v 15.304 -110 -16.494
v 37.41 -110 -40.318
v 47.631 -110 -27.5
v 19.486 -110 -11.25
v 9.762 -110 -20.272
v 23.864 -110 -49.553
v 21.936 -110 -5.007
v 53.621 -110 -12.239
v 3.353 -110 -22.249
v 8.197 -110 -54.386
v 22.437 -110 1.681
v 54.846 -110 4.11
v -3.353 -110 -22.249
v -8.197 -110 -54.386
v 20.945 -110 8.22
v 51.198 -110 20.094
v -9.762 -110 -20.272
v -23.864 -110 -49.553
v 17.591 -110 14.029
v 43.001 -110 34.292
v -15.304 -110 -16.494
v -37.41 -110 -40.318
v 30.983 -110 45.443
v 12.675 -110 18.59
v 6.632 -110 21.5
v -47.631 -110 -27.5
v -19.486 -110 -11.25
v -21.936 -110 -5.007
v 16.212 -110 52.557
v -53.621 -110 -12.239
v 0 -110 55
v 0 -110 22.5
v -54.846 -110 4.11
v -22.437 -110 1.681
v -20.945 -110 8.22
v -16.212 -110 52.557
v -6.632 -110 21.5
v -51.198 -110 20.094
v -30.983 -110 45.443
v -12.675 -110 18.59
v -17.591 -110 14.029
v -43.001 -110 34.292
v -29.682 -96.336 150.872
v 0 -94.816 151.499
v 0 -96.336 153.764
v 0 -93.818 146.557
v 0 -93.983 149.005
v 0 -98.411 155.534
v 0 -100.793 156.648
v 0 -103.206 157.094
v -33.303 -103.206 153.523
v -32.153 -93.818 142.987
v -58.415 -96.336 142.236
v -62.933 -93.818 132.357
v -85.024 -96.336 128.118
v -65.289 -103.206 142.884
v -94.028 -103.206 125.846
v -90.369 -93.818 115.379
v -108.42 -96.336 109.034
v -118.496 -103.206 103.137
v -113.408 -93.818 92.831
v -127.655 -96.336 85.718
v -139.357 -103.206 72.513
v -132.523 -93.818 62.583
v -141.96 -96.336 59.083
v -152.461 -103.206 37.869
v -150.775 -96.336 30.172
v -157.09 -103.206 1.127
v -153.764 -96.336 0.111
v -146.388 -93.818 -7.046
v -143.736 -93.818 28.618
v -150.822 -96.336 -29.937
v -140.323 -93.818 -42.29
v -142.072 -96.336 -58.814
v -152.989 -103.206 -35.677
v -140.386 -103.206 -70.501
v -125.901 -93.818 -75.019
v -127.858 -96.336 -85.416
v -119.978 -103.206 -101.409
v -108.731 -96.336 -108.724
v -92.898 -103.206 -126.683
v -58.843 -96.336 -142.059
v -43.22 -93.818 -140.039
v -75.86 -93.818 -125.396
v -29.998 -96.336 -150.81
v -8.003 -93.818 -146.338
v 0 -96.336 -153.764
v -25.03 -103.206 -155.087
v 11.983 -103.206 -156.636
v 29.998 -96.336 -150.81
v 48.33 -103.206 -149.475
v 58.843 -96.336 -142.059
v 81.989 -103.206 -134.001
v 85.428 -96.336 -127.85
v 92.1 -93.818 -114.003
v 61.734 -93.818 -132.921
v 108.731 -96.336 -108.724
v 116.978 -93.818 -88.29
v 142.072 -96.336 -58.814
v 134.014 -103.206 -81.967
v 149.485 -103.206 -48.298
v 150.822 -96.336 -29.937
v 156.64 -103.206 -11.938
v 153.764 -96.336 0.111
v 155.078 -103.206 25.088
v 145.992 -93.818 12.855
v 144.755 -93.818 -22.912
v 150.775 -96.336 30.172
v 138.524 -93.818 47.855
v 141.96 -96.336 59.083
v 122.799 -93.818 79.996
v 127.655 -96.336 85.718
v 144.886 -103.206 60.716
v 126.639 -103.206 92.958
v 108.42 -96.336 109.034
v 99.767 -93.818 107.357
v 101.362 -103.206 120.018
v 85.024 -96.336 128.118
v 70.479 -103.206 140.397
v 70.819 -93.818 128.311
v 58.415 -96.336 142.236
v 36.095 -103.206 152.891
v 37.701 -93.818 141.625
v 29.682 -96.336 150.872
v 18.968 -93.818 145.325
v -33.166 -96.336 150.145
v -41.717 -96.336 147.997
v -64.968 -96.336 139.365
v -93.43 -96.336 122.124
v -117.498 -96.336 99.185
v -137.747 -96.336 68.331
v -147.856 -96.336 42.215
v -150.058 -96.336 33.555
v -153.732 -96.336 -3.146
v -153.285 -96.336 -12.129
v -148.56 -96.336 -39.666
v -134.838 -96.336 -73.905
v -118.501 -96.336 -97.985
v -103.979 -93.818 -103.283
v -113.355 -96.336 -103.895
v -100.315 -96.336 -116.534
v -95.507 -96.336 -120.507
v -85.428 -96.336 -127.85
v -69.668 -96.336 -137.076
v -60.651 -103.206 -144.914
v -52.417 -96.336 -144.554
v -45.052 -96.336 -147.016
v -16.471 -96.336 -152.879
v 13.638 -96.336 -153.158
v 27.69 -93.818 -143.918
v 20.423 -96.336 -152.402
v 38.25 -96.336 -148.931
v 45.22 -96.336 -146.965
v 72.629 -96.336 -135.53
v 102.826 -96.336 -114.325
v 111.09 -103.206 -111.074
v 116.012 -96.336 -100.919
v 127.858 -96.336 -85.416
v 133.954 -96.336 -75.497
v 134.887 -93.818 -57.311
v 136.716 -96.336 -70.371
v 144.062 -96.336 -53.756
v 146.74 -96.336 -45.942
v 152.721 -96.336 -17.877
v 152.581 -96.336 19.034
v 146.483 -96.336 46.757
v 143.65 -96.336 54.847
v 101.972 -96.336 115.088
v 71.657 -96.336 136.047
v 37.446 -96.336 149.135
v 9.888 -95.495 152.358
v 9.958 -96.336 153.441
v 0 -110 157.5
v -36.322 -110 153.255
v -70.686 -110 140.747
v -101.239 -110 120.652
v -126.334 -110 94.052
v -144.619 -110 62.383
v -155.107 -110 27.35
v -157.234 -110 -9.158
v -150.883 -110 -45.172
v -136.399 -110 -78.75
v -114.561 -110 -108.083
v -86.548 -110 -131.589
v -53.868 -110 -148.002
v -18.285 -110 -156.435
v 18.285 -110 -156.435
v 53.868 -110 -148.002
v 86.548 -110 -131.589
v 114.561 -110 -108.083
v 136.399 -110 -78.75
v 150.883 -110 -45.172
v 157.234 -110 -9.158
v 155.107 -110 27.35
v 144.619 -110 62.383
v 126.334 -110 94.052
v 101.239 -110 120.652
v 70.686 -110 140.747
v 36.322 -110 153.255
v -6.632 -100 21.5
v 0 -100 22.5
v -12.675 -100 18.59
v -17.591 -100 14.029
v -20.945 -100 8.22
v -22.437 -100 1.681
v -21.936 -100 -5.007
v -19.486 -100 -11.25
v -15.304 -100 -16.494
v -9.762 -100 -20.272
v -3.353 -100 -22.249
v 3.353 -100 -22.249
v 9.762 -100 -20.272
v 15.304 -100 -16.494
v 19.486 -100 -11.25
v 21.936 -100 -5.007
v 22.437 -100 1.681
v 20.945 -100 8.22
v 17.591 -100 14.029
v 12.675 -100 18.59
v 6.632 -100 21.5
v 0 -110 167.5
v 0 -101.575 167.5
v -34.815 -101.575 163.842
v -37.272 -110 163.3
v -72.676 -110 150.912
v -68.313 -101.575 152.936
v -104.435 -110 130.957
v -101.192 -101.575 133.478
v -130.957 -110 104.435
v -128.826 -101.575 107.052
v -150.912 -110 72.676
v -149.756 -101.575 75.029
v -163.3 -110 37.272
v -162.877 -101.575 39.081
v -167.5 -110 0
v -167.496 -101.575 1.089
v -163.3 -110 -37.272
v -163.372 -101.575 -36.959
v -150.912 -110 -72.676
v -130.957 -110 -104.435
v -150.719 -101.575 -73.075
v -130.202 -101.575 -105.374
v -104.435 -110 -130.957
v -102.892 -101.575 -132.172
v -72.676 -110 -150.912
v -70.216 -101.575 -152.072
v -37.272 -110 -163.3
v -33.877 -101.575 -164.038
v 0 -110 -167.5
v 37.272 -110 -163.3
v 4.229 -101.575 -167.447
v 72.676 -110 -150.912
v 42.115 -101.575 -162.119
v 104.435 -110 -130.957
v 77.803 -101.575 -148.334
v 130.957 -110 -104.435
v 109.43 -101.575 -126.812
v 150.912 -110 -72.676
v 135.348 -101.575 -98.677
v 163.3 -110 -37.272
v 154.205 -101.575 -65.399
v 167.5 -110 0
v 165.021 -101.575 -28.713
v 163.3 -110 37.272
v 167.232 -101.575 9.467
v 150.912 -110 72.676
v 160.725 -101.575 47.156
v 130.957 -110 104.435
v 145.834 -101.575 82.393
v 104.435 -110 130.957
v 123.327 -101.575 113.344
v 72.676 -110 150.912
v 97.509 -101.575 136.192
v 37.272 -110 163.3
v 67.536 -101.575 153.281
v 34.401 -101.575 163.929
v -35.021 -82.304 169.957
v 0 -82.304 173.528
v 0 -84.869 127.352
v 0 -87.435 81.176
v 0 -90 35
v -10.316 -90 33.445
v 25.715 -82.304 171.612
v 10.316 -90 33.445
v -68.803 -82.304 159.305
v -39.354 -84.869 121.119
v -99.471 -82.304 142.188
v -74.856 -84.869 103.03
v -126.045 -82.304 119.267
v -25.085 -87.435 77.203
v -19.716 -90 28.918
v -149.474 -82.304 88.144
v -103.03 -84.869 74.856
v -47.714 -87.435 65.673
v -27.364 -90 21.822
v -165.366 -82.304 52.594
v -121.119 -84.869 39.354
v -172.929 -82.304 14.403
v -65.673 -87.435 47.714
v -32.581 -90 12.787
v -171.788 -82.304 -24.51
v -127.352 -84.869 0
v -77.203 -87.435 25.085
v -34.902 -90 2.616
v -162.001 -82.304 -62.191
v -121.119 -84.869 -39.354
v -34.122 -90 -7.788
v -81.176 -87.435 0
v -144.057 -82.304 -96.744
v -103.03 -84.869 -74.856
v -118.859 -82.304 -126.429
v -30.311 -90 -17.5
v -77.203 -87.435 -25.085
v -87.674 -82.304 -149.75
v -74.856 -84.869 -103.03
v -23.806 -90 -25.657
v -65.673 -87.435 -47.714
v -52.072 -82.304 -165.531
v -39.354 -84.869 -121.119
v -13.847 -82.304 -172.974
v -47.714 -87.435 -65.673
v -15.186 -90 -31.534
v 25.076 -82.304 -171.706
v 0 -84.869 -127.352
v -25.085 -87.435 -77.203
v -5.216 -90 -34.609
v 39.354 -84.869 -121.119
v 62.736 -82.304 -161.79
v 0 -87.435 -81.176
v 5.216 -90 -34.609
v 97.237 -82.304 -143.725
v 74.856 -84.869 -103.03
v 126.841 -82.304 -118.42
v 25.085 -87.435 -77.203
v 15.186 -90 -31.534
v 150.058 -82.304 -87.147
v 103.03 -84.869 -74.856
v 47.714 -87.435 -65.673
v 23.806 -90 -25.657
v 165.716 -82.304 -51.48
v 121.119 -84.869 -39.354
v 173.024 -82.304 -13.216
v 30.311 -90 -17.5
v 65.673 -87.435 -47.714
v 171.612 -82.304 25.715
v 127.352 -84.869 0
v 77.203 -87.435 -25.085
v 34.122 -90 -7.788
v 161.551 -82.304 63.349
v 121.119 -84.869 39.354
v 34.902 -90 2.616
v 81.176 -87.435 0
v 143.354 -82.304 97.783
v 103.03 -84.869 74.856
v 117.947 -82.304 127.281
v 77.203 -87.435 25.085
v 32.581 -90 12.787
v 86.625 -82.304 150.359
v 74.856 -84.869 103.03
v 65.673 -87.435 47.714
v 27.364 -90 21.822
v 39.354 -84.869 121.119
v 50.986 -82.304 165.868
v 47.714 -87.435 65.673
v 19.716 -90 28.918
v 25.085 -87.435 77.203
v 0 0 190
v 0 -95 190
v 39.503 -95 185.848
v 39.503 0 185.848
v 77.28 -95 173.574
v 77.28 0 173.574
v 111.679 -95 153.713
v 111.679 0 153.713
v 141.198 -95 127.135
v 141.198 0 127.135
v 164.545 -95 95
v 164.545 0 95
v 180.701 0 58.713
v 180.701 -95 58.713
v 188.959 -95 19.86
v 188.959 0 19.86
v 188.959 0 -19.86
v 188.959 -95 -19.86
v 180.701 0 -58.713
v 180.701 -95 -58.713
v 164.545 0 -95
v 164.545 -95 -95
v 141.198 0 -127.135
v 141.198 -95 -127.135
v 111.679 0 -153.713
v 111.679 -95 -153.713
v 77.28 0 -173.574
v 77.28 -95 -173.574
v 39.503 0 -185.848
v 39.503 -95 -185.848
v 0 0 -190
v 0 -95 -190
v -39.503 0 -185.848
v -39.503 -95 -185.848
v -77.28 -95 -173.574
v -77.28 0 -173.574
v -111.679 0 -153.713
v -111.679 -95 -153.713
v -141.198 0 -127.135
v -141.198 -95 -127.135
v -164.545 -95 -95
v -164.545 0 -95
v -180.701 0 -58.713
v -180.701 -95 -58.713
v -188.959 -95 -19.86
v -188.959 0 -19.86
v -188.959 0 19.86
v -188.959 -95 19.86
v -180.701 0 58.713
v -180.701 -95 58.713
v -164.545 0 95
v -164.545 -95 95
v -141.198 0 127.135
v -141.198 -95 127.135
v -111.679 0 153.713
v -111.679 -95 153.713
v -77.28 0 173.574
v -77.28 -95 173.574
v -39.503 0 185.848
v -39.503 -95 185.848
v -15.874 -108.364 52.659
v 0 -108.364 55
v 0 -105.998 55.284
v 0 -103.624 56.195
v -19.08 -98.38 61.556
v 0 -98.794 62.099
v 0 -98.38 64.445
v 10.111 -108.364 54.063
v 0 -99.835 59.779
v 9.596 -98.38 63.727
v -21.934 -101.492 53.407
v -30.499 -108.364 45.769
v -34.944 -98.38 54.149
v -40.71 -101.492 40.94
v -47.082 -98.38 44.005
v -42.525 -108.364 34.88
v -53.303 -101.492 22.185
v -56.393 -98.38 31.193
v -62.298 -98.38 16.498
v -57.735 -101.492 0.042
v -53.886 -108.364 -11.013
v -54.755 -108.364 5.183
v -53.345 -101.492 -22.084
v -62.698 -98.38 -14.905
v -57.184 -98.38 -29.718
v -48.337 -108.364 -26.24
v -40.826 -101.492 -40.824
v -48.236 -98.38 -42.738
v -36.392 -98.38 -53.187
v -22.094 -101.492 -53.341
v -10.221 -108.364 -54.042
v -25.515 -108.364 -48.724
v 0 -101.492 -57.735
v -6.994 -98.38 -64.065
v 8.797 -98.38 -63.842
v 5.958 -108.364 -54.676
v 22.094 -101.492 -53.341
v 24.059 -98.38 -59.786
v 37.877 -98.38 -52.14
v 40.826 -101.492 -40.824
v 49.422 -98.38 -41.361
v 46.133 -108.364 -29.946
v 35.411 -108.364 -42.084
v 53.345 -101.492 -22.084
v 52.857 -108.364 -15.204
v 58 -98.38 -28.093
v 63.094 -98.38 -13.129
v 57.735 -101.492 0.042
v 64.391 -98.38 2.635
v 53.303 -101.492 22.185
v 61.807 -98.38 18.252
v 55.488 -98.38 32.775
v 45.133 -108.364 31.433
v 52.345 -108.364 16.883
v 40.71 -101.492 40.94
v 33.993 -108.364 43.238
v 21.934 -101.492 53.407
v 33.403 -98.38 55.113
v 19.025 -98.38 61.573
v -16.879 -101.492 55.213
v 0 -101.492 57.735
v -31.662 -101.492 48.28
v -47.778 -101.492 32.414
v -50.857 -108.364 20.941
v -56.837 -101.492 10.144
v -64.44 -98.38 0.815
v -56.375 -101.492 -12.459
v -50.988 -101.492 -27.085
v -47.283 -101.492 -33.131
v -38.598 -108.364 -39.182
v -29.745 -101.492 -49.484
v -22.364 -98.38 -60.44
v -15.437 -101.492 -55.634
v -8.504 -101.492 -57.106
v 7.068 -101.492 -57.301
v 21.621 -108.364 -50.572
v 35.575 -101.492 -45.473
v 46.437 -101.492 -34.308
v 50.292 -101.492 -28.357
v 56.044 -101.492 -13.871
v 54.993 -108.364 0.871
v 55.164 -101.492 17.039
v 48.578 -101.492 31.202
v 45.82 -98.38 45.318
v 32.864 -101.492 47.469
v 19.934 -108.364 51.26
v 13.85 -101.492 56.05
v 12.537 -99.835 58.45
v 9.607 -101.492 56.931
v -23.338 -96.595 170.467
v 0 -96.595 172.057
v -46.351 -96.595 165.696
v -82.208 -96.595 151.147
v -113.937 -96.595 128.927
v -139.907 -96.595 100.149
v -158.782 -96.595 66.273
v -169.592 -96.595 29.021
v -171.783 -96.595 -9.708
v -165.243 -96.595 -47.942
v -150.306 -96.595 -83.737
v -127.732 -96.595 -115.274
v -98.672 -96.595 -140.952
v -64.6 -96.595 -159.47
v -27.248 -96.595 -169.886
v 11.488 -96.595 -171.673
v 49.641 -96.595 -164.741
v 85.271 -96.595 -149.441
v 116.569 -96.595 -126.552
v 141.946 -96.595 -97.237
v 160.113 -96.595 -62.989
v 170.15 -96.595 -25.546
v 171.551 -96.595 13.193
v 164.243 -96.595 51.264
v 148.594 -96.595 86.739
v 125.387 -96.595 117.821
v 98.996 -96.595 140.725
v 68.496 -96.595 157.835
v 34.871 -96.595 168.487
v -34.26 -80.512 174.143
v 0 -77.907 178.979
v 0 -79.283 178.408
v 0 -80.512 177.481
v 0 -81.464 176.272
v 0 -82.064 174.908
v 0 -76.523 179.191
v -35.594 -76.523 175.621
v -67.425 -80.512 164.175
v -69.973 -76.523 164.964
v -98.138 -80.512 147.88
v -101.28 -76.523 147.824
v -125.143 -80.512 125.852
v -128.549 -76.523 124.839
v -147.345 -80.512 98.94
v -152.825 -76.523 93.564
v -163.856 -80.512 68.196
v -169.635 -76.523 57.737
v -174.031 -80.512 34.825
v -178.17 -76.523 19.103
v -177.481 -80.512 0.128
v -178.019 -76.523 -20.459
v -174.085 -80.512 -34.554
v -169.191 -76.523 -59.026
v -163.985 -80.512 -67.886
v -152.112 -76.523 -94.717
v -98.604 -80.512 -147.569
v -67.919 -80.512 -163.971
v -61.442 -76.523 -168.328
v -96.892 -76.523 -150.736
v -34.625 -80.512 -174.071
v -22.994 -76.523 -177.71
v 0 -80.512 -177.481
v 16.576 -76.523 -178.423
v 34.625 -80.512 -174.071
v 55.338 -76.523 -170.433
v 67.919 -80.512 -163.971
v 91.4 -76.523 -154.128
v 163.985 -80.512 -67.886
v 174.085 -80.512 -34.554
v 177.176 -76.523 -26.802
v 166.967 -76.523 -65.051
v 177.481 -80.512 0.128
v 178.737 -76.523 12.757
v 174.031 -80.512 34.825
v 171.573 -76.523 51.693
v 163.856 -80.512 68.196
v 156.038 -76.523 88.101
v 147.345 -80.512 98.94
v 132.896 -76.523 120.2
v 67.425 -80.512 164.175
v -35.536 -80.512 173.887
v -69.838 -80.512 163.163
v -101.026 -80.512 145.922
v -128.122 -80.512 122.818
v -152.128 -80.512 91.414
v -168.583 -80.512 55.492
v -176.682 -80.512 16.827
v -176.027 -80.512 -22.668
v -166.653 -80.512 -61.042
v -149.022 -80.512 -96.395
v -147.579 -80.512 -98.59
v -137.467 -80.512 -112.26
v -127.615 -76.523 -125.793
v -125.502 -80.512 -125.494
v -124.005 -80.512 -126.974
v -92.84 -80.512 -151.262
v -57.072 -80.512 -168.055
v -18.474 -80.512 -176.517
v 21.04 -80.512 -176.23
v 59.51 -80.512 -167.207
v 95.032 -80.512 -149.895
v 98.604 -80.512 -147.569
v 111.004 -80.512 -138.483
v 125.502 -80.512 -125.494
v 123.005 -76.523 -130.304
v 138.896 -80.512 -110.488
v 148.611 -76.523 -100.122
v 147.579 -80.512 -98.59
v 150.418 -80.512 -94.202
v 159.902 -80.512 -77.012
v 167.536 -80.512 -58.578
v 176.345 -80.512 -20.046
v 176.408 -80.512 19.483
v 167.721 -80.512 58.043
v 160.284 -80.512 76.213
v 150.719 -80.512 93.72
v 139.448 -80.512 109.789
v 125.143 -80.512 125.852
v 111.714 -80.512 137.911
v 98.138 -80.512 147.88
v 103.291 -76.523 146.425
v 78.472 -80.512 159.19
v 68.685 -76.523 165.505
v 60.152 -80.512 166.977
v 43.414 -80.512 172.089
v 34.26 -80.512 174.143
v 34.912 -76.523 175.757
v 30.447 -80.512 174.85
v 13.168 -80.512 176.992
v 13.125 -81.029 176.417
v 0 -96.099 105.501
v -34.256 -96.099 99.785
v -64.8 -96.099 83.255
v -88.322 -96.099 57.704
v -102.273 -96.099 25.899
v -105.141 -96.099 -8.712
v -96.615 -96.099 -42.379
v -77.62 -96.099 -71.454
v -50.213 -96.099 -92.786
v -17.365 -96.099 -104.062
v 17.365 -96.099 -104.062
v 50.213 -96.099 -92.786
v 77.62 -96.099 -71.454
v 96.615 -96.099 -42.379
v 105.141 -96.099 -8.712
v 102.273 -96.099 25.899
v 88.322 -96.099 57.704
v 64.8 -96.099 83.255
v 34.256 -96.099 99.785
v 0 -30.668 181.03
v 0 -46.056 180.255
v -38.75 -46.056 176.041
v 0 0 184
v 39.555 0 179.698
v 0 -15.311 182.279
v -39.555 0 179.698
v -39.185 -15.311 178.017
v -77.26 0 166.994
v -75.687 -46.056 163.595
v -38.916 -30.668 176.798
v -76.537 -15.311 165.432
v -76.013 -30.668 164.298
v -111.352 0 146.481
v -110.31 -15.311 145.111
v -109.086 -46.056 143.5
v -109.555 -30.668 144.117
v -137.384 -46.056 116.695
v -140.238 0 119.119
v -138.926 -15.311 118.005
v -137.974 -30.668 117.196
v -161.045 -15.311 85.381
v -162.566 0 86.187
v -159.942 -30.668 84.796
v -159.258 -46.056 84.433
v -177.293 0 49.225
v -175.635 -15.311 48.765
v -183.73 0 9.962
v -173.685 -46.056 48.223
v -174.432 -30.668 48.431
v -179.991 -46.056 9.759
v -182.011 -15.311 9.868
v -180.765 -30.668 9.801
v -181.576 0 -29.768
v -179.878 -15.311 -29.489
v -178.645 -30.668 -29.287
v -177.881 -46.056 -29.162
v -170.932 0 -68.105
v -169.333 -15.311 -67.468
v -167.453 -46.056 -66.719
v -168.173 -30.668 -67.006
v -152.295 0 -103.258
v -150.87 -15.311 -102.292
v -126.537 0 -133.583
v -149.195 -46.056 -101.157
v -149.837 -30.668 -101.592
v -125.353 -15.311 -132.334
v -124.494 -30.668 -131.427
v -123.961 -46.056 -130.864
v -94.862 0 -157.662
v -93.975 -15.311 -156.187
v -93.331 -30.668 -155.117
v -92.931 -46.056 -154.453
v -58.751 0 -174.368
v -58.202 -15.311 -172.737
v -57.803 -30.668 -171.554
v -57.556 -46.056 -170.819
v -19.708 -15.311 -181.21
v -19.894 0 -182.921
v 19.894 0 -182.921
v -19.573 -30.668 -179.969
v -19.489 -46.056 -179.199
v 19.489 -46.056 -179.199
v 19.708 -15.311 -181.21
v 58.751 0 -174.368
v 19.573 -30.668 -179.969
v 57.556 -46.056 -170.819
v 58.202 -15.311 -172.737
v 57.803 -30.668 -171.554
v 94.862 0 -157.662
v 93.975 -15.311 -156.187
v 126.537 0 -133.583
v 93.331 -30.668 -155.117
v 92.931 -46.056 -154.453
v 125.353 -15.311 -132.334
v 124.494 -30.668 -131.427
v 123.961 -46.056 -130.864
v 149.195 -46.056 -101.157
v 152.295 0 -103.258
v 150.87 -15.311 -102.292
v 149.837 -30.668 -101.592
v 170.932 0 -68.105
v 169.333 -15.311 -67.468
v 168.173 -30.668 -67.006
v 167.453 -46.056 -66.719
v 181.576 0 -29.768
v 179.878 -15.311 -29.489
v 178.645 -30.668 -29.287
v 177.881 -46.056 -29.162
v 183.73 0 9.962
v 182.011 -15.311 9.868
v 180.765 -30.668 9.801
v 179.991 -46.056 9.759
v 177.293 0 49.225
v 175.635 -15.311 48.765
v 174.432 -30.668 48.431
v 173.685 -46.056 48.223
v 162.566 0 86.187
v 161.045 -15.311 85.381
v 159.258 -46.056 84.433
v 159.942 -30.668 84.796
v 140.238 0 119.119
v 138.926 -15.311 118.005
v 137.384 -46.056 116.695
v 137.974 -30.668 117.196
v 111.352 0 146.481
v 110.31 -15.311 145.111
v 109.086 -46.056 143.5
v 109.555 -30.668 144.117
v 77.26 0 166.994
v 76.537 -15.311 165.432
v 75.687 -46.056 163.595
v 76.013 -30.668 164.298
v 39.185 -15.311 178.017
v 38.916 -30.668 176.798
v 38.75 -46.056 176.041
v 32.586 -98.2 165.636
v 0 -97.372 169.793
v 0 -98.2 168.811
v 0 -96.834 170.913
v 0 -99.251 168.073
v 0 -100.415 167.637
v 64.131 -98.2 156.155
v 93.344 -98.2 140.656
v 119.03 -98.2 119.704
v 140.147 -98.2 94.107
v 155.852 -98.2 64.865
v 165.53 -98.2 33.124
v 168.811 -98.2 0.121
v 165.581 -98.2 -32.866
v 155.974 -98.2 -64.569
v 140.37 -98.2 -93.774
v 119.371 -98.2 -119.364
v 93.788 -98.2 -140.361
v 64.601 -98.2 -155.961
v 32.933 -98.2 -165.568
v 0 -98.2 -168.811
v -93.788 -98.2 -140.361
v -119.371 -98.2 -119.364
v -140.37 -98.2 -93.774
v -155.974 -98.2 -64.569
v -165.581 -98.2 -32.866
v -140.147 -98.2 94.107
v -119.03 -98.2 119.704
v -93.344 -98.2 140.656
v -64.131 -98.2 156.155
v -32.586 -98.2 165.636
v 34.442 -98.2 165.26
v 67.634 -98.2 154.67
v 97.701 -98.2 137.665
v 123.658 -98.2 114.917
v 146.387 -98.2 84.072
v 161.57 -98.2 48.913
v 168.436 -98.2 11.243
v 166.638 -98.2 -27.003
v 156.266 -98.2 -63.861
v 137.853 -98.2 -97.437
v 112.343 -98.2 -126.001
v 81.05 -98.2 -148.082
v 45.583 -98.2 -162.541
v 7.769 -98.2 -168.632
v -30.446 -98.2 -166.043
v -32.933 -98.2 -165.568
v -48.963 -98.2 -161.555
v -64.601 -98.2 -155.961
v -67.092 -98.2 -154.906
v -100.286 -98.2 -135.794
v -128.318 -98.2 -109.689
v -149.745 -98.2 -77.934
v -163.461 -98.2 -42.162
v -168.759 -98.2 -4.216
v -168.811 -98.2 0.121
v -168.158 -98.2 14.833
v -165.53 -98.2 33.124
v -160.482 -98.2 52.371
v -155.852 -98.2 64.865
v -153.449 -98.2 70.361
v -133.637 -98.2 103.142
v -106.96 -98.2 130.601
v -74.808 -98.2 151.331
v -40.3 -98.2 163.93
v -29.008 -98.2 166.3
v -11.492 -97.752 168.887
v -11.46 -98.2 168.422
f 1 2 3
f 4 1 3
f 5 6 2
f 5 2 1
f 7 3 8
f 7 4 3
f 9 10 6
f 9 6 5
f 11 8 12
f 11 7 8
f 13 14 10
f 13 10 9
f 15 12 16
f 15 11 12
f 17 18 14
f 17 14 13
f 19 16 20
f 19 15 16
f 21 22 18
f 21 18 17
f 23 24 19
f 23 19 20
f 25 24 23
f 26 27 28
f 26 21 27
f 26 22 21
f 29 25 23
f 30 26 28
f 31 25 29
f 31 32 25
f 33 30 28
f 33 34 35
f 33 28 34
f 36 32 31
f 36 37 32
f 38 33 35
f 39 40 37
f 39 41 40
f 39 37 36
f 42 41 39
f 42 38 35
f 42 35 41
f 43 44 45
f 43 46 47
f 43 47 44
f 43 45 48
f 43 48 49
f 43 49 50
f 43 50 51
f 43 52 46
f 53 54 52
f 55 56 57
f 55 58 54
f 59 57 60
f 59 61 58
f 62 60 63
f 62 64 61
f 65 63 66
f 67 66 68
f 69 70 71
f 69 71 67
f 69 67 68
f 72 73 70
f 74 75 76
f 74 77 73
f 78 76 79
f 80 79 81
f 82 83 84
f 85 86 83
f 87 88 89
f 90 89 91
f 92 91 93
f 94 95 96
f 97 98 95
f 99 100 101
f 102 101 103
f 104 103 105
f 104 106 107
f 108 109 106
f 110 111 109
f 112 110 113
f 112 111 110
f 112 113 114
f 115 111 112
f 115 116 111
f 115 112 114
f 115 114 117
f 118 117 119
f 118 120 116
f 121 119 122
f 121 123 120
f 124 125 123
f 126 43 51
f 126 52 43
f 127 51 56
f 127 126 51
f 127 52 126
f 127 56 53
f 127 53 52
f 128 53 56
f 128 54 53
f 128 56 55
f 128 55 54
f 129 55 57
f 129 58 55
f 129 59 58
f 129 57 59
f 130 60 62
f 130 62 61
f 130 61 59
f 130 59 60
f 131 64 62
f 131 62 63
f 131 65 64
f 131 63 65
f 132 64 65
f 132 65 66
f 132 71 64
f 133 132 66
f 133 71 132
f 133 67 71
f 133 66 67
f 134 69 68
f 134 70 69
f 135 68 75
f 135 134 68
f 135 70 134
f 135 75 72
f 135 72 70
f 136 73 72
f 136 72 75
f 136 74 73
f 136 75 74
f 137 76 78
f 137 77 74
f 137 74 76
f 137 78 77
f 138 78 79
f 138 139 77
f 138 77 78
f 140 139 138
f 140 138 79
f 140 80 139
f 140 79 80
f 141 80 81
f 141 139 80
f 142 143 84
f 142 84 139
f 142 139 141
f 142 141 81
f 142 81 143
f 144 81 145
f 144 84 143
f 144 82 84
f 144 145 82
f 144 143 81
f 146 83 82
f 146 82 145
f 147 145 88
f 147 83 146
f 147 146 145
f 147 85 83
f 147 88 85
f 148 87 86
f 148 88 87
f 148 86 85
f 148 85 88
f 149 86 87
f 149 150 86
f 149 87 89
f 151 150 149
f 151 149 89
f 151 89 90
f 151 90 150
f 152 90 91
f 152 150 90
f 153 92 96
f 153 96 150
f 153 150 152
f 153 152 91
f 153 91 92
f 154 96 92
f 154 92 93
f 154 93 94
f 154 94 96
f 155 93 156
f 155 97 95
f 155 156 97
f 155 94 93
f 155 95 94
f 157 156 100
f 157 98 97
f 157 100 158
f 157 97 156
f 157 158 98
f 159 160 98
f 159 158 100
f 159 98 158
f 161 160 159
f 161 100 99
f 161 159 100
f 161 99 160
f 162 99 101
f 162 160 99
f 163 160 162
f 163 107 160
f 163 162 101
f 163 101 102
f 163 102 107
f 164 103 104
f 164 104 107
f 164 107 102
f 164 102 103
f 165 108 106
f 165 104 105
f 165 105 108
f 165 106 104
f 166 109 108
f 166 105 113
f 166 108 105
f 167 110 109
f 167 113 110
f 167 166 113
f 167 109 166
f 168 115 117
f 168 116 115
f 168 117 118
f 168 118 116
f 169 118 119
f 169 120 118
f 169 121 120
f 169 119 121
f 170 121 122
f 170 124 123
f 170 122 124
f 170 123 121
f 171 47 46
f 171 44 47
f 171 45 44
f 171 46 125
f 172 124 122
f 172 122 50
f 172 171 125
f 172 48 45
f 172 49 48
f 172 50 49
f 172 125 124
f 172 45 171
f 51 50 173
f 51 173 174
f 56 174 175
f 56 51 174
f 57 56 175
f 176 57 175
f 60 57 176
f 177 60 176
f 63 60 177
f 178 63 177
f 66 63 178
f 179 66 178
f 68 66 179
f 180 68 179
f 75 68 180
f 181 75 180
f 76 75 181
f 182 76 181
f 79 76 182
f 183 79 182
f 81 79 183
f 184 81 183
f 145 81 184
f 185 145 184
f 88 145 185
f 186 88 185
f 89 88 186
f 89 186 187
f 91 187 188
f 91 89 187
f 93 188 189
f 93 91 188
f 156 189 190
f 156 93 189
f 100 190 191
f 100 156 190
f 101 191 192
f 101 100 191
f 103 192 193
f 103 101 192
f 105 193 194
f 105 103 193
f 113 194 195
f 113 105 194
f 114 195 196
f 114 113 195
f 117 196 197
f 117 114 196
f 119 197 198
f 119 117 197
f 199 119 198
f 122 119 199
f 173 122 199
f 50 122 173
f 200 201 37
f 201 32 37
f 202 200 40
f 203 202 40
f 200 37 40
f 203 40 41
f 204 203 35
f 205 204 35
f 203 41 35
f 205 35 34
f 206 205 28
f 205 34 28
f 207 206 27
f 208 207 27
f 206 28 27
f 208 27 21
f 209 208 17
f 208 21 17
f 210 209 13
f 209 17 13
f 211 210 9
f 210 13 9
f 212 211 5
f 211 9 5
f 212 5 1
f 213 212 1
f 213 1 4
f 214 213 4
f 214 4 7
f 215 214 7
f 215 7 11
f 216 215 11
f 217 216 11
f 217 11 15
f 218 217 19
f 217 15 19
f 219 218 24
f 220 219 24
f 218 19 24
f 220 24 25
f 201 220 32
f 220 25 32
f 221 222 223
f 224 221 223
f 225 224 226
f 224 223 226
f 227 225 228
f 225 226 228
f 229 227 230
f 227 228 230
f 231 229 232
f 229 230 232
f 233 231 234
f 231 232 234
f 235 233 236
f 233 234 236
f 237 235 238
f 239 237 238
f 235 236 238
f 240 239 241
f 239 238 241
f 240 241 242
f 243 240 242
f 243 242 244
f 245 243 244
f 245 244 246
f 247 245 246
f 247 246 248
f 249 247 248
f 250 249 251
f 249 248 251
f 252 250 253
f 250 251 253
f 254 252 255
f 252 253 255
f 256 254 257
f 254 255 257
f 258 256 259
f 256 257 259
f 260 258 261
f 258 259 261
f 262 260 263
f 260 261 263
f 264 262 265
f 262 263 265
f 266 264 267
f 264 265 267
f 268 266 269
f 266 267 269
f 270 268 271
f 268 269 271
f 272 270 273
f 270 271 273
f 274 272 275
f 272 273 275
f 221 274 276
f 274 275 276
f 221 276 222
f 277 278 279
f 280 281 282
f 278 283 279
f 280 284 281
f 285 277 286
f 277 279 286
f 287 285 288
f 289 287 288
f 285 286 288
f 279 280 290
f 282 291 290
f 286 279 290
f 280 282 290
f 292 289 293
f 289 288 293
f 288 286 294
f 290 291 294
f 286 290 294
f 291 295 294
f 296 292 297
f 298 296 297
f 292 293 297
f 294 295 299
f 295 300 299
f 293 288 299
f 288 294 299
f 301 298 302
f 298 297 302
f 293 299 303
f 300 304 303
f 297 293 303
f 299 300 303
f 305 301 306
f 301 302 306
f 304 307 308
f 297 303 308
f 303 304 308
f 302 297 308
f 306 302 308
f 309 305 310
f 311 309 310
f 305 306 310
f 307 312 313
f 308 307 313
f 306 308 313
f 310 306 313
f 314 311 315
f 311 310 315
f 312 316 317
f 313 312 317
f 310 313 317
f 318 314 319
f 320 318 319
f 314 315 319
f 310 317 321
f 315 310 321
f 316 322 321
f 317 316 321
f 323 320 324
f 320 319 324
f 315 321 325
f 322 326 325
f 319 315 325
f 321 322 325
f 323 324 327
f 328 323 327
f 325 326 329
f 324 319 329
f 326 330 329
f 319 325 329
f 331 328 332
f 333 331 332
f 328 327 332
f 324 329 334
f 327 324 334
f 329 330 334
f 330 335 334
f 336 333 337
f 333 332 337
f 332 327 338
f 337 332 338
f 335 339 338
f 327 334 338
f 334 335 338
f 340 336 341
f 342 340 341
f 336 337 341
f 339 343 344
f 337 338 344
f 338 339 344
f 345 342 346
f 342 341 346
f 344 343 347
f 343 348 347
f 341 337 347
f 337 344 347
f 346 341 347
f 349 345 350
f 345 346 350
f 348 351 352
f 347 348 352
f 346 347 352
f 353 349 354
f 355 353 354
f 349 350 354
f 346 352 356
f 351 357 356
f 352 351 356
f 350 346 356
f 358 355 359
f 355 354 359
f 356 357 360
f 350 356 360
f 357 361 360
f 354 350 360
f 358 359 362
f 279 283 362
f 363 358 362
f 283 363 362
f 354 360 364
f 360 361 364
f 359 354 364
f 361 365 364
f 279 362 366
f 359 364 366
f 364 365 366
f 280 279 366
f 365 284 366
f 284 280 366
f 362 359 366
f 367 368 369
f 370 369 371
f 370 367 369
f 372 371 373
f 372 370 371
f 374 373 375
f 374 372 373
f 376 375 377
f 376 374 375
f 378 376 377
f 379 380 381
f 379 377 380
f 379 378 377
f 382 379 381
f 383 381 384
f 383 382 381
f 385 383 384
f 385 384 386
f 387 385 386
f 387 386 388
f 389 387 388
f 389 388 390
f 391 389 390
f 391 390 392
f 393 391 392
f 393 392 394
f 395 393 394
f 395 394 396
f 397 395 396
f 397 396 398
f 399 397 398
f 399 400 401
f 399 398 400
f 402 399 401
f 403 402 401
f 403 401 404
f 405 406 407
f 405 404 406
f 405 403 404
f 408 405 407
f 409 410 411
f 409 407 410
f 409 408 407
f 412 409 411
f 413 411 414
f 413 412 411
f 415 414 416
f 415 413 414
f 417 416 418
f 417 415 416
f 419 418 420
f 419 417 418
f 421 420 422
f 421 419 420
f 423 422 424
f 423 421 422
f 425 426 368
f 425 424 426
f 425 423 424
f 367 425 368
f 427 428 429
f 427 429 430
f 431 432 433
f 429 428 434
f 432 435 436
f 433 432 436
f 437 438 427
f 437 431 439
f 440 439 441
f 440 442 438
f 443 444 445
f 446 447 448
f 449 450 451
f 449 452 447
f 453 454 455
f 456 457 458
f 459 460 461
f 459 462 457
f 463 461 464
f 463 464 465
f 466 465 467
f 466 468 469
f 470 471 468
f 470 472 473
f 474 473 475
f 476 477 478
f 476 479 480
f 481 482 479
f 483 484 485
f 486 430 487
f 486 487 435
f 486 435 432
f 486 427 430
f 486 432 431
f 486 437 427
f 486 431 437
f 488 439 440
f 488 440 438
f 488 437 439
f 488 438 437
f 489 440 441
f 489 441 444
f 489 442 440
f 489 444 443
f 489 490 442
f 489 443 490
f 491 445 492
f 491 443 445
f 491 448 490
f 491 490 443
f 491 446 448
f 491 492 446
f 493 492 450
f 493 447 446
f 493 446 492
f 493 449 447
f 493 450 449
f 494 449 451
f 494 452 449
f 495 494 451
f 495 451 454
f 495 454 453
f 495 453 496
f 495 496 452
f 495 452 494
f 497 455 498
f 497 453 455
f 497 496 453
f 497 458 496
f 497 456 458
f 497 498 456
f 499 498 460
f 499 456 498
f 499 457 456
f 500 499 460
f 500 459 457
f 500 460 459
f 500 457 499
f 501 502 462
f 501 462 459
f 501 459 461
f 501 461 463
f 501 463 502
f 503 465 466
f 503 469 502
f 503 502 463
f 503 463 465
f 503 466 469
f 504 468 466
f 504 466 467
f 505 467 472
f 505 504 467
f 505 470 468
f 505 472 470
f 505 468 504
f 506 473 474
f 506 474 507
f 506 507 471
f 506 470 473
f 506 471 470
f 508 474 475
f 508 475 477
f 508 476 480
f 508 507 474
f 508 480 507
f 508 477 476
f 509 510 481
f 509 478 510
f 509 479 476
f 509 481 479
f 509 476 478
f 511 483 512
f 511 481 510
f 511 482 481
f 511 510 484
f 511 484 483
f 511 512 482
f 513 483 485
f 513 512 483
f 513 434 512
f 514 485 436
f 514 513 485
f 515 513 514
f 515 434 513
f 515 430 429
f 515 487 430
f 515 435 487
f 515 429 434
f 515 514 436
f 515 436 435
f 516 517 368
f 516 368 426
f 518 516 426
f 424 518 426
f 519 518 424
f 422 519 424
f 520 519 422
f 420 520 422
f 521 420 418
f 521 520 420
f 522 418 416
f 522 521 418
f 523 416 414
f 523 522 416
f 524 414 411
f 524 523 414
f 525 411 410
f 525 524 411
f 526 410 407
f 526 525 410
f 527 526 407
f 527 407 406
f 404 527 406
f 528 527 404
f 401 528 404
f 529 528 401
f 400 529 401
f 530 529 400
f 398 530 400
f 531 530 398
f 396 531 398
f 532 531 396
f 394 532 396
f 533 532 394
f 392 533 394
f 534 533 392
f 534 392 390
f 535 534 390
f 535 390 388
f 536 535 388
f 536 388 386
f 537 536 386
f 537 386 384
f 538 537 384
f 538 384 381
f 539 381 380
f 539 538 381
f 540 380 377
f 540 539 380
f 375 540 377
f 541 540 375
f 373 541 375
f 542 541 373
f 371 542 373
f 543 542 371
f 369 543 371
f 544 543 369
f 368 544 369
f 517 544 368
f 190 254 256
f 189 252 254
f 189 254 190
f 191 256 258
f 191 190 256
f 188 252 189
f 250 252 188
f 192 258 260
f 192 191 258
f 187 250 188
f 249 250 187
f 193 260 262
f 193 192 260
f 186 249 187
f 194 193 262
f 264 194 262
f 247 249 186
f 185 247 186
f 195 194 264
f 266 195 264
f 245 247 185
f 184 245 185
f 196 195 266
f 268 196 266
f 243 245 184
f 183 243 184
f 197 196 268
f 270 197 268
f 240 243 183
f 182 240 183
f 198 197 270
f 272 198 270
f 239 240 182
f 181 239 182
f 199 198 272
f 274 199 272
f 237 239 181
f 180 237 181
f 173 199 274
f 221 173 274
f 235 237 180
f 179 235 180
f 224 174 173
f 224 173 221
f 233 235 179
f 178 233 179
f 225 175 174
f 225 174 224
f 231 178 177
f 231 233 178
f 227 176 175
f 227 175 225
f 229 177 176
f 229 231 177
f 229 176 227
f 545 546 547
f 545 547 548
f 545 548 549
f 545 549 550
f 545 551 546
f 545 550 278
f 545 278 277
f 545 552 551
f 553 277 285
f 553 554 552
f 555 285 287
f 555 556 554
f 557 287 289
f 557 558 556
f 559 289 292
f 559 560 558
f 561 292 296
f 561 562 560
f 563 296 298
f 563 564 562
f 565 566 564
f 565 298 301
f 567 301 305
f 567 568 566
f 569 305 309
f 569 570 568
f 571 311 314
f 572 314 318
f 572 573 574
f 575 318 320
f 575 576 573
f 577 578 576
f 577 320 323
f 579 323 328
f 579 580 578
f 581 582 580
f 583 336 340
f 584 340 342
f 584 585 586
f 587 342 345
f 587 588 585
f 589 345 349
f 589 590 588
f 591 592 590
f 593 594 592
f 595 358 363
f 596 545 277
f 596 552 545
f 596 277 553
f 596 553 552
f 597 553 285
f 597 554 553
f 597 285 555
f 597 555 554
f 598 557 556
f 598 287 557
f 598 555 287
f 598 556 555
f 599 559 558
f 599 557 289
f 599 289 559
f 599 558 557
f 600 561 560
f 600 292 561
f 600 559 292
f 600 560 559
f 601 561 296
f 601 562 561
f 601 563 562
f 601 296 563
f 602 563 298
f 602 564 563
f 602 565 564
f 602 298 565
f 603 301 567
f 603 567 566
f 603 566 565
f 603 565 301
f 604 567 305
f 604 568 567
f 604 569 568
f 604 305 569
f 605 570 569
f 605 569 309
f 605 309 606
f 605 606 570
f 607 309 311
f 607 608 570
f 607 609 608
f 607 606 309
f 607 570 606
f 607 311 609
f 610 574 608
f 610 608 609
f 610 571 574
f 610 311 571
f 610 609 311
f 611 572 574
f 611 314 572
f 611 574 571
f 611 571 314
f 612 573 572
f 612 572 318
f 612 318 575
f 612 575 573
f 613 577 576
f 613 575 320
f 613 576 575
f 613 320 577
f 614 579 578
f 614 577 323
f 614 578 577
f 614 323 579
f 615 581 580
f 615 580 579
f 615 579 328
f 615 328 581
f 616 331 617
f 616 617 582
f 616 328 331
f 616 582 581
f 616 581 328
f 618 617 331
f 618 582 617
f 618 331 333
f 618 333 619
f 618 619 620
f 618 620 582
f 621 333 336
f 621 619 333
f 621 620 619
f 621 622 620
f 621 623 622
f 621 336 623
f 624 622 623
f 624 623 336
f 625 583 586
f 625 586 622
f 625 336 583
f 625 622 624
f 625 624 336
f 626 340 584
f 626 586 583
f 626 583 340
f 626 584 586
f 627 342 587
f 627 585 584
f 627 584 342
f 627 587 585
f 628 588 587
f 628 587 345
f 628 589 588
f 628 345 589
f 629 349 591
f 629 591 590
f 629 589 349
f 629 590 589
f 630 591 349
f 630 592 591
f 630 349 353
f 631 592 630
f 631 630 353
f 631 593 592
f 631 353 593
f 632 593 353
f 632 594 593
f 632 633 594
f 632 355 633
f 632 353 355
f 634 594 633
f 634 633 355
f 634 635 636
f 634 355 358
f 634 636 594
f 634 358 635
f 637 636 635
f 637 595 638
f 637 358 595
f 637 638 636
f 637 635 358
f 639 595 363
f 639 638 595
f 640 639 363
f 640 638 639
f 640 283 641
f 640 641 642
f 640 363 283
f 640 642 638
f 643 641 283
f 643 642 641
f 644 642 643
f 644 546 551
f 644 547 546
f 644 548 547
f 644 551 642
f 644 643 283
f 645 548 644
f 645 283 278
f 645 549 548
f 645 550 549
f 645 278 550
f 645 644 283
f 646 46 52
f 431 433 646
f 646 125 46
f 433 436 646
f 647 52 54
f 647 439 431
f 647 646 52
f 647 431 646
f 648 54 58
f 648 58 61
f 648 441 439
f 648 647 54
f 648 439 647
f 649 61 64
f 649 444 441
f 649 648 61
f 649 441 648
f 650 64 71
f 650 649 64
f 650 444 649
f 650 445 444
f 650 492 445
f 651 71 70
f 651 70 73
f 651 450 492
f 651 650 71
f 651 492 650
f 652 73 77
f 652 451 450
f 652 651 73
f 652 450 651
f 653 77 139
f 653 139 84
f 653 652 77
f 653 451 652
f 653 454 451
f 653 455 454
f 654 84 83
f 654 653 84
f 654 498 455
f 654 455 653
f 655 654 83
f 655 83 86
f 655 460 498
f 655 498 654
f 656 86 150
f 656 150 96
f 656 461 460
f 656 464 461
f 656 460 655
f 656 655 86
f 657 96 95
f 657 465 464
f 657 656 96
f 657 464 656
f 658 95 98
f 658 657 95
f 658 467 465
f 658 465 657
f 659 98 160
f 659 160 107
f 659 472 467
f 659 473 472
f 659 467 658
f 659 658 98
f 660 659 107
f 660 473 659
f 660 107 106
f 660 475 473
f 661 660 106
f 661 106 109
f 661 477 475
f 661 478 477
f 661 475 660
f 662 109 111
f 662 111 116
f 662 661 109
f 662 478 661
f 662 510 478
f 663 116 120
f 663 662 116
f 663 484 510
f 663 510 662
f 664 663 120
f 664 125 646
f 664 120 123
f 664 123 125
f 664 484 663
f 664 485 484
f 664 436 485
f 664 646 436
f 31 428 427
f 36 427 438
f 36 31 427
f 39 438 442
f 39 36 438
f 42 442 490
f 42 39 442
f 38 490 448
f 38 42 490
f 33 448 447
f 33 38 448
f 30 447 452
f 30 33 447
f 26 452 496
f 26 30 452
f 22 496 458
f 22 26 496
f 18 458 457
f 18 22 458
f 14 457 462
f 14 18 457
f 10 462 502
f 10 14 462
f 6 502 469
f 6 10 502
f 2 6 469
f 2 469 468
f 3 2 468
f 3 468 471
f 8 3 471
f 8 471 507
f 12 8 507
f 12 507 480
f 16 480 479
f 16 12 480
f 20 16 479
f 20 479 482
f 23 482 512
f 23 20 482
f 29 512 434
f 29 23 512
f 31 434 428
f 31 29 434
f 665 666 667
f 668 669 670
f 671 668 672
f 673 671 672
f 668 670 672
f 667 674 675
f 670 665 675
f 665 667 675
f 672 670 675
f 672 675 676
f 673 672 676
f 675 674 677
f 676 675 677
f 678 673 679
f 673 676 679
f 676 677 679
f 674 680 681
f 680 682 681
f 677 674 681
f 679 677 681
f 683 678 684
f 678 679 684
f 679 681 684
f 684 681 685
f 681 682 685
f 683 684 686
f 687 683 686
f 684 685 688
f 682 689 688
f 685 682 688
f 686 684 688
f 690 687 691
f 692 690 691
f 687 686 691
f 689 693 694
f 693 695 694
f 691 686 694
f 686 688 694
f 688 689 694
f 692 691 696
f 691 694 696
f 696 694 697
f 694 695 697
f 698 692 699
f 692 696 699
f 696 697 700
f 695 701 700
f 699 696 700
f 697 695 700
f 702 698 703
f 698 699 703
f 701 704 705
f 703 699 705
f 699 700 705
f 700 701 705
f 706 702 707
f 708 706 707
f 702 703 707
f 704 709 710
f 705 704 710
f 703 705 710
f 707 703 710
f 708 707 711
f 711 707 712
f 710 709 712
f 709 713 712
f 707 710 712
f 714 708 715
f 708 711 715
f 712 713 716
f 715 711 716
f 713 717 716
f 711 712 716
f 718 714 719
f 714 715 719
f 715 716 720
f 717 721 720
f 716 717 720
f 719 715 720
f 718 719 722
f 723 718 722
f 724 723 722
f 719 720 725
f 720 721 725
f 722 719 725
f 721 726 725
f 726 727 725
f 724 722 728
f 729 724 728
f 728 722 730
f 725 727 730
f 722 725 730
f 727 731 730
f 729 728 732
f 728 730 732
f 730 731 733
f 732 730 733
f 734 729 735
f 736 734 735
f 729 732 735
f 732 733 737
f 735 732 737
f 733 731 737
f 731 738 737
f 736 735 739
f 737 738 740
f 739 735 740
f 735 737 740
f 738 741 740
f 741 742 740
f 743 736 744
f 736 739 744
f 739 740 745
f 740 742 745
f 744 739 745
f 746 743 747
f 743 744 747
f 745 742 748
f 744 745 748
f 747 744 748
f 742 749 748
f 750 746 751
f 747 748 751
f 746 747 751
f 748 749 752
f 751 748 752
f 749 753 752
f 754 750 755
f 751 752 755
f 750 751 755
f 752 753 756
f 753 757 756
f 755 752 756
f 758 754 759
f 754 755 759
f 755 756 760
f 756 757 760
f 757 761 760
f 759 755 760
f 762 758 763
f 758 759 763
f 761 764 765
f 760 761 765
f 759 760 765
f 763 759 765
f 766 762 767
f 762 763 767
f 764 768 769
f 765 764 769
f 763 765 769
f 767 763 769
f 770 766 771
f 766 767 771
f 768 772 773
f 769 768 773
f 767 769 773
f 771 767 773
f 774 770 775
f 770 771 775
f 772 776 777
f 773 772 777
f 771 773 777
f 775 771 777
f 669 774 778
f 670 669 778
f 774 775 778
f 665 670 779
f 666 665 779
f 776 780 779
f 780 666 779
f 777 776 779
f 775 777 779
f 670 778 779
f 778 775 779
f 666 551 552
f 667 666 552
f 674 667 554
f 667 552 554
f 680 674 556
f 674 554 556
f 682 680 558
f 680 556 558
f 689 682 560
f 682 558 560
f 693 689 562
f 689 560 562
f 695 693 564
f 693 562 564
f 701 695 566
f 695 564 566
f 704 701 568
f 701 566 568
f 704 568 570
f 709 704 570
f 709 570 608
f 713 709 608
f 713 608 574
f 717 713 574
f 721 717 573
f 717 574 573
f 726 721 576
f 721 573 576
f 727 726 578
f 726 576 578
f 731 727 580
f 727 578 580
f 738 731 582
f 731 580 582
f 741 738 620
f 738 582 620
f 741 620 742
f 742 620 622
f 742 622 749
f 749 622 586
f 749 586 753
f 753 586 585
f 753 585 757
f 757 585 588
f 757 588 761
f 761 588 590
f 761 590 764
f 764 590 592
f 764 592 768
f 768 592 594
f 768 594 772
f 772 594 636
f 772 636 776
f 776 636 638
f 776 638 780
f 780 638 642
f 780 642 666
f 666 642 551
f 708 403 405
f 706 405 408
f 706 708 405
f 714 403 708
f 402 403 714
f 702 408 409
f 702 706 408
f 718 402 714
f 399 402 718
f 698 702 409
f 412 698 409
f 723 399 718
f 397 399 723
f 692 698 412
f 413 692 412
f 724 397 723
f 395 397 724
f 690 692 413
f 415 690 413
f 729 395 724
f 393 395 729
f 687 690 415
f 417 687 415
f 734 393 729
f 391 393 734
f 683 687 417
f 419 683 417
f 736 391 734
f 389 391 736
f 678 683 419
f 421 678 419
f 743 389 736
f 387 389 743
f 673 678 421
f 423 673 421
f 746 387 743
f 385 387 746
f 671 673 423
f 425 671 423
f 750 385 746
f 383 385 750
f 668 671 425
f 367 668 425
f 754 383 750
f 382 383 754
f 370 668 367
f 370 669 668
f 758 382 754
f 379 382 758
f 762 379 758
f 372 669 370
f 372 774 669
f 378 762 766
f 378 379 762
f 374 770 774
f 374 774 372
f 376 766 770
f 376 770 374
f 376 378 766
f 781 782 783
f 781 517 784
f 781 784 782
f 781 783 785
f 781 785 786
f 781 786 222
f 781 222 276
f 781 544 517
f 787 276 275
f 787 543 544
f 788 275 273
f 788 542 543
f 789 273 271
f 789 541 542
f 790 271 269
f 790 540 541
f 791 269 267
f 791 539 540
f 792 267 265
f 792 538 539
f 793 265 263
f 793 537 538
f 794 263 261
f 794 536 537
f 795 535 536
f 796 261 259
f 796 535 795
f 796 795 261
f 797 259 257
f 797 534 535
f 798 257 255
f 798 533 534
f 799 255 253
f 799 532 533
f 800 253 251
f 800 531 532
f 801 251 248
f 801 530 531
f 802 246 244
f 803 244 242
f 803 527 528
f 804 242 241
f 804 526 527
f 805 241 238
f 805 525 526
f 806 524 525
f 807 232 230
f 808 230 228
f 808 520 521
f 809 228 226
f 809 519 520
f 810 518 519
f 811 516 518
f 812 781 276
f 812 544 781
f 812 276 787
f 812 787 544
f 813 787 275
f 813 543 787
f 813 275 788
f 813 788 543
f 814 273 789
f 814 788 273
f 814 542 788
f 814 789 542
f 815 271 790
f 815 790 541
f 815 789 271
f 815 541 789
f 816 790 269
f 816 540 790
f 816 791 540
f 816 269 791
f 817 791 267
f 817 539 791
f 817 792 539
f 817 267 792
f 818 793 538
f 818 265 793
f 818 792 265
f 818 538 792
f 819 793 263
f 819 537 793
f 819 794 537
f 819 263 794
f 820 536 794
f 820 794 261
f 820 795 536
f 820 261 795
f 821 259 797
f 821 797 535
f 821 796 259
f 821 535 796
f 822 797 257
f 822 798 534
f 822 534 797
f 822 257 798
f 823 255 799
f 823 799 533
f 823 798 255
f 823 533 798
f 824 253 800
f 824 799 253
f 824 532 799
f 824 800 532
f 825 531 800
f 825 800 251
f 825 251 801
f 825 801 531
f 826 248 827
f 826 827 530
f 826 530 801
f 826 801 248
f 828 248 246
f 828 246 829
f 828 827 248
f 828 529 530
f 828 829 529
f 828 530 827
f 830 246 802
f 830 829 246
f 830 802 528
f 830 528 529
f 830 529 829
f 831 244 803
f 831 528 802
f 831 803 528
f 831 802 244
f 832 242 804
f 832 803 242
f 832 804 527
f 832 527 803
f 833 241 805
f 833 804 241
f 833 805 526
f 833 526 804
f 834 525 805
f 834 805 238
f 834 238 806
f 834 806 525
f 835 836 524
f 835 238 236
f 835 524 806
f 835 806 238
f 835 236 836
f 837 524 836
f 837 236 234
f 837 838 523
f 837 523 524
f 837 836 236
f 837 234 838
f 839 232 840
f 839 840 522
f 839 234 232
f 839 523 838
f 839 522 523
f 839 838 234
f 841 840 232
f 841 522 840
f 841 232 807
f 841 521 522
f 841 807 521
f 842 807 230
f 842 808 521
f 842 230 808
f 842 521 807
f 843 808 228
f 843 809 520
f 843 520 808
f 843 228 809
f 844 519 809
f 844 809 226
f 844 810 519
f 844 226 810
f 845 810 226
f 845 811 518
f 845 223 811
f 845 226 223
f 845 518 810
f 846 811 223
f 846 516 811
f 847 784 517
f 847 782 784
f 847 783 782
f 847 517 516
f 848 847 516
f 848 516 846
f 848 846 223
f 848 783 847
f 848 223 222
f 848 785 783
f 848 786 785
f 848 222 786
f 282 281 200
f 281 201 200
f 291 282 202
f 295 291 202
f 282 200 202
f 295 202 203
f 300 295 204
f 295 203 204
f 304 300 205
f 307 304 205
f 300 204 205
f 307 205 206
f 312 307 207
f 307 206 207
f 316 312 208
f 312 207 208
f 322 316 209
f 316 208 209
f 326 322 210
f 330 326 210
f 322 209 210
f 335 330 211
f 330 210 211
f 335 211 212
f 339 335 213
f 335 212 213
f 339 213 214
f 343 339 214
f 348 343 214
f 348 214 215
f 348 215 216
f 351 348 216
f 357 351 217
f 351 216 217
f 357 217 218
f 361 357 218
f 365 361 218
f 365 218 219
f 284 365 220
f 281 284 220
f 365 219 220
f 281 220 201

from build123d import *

# Parameters (mm, degrees)
SKETCH_1_R      = 190
EXTRUDE_1_DEPTH = 95
SKETCH_2_R      = 167.5
EXTRUDE_2_DEPTH = 15
SKETCH_4_R      = 167.5
FILLET_1_R      = 5
FILLET_2_R      = 6
FILLET_3_R      = 10


with BuildPart() as part:
    # 草图1 → 凸台-拉伸1 (new body)
    with BuildSketch(Plane(origin=(0, 0, 0), x_dir=(1, 0, 0), z_dir=(0, 1, 0))):
        with Locations(Location((0, 0, 0), (0, 0, 270))):
            Circle(SKETCH_1_R)
    extrude(amount=-EXTRUDE_1_DEPTH)

    # 草图2 → 凸台-拉伸2 (add)
    with BuildSketch(Plane.XZ.offset(95)):
        with Locations(Location((0, 0, 0), (0, 0, 90))):
            Circle(SKETCH_2_R)
    extrude(amount=EXTRUDE_2_DEPTH)

    # 草图4 → section 1 of loft_1
    with BuildSketch(Plane(origin=(0, -97, 0), x_dir=(-1, 0, 0), z_dir=(0, -1, 0)), mode=Mode.PRIVATE) as loft_1_s1:
        Circle(SKETCH_4_R)
    # loft up to a face of the part (loft_1)
    loft([Face(Wire([part.edges().sort_by_distance((-138.50403921, -95, -130.063950126))[0]])), loft_1_s1.sketch])

    # 圆角1
    fillet_1_edges = [part.edges().sort_by_distance(p)[0] for p in [
        (0, -97, -167.5),
    ]]
    fillet(fillet_1_edges, radius=FILLET_1_R)

    # 草图3 → 切除-旋转1 (revolve, cut)
    with BuildSketch(Plane.XY, mode=Mode.PRIVATE) as cut_revolve_1_sk:
        with BuildLine():
            Line((-179, -82), (-35, -90))
            Line((-35, -90), (-22.5, -100))
            Line((-22.5, -100), (-22.5, -110))
            Line((-22.5, -110), (0, -110))
            Line((0, -110), (0, 0))
            Line((0, 0), (-184, 0))
            ThreePointArc((-184, 0), (-181.595265599, -22.984806931), (-180.255185832, -46.056180609))
            Line((-180.255185832, -46.056180609), (-179, -82))
        make_face()
        Polygon((-157.5, -110), (-156.5, -93.26542021), (-55, -98.904309099), (-55, -110), align=None)
    revolve(cut_revolve_1_sk.sketch.rotate(Axis((0, 0, 0), (0, -1, 0)), 270), axis=Axis((0, 0, 0), (0, -1, 0)), mode=Mode.SUBTRACT)

    # 圆角2
    fillet_2_edges = [part.edges().sort_by_distance(p)[0] for p in [
        (0, -82, -179),
    ]]
    fillet(fillet_2_edges, radius=FILLET_2_R)

    # 圆角3
    fillet_3_edges = [part.edges().sort_by_distance(p)[0] for p in [
        (0, -98.904309099, -55),
        (0, -93.26542021, -156.5),
    ]]
    fillet(fillet_3_edges, radius=FILLET_3_R)


solid = part.part
